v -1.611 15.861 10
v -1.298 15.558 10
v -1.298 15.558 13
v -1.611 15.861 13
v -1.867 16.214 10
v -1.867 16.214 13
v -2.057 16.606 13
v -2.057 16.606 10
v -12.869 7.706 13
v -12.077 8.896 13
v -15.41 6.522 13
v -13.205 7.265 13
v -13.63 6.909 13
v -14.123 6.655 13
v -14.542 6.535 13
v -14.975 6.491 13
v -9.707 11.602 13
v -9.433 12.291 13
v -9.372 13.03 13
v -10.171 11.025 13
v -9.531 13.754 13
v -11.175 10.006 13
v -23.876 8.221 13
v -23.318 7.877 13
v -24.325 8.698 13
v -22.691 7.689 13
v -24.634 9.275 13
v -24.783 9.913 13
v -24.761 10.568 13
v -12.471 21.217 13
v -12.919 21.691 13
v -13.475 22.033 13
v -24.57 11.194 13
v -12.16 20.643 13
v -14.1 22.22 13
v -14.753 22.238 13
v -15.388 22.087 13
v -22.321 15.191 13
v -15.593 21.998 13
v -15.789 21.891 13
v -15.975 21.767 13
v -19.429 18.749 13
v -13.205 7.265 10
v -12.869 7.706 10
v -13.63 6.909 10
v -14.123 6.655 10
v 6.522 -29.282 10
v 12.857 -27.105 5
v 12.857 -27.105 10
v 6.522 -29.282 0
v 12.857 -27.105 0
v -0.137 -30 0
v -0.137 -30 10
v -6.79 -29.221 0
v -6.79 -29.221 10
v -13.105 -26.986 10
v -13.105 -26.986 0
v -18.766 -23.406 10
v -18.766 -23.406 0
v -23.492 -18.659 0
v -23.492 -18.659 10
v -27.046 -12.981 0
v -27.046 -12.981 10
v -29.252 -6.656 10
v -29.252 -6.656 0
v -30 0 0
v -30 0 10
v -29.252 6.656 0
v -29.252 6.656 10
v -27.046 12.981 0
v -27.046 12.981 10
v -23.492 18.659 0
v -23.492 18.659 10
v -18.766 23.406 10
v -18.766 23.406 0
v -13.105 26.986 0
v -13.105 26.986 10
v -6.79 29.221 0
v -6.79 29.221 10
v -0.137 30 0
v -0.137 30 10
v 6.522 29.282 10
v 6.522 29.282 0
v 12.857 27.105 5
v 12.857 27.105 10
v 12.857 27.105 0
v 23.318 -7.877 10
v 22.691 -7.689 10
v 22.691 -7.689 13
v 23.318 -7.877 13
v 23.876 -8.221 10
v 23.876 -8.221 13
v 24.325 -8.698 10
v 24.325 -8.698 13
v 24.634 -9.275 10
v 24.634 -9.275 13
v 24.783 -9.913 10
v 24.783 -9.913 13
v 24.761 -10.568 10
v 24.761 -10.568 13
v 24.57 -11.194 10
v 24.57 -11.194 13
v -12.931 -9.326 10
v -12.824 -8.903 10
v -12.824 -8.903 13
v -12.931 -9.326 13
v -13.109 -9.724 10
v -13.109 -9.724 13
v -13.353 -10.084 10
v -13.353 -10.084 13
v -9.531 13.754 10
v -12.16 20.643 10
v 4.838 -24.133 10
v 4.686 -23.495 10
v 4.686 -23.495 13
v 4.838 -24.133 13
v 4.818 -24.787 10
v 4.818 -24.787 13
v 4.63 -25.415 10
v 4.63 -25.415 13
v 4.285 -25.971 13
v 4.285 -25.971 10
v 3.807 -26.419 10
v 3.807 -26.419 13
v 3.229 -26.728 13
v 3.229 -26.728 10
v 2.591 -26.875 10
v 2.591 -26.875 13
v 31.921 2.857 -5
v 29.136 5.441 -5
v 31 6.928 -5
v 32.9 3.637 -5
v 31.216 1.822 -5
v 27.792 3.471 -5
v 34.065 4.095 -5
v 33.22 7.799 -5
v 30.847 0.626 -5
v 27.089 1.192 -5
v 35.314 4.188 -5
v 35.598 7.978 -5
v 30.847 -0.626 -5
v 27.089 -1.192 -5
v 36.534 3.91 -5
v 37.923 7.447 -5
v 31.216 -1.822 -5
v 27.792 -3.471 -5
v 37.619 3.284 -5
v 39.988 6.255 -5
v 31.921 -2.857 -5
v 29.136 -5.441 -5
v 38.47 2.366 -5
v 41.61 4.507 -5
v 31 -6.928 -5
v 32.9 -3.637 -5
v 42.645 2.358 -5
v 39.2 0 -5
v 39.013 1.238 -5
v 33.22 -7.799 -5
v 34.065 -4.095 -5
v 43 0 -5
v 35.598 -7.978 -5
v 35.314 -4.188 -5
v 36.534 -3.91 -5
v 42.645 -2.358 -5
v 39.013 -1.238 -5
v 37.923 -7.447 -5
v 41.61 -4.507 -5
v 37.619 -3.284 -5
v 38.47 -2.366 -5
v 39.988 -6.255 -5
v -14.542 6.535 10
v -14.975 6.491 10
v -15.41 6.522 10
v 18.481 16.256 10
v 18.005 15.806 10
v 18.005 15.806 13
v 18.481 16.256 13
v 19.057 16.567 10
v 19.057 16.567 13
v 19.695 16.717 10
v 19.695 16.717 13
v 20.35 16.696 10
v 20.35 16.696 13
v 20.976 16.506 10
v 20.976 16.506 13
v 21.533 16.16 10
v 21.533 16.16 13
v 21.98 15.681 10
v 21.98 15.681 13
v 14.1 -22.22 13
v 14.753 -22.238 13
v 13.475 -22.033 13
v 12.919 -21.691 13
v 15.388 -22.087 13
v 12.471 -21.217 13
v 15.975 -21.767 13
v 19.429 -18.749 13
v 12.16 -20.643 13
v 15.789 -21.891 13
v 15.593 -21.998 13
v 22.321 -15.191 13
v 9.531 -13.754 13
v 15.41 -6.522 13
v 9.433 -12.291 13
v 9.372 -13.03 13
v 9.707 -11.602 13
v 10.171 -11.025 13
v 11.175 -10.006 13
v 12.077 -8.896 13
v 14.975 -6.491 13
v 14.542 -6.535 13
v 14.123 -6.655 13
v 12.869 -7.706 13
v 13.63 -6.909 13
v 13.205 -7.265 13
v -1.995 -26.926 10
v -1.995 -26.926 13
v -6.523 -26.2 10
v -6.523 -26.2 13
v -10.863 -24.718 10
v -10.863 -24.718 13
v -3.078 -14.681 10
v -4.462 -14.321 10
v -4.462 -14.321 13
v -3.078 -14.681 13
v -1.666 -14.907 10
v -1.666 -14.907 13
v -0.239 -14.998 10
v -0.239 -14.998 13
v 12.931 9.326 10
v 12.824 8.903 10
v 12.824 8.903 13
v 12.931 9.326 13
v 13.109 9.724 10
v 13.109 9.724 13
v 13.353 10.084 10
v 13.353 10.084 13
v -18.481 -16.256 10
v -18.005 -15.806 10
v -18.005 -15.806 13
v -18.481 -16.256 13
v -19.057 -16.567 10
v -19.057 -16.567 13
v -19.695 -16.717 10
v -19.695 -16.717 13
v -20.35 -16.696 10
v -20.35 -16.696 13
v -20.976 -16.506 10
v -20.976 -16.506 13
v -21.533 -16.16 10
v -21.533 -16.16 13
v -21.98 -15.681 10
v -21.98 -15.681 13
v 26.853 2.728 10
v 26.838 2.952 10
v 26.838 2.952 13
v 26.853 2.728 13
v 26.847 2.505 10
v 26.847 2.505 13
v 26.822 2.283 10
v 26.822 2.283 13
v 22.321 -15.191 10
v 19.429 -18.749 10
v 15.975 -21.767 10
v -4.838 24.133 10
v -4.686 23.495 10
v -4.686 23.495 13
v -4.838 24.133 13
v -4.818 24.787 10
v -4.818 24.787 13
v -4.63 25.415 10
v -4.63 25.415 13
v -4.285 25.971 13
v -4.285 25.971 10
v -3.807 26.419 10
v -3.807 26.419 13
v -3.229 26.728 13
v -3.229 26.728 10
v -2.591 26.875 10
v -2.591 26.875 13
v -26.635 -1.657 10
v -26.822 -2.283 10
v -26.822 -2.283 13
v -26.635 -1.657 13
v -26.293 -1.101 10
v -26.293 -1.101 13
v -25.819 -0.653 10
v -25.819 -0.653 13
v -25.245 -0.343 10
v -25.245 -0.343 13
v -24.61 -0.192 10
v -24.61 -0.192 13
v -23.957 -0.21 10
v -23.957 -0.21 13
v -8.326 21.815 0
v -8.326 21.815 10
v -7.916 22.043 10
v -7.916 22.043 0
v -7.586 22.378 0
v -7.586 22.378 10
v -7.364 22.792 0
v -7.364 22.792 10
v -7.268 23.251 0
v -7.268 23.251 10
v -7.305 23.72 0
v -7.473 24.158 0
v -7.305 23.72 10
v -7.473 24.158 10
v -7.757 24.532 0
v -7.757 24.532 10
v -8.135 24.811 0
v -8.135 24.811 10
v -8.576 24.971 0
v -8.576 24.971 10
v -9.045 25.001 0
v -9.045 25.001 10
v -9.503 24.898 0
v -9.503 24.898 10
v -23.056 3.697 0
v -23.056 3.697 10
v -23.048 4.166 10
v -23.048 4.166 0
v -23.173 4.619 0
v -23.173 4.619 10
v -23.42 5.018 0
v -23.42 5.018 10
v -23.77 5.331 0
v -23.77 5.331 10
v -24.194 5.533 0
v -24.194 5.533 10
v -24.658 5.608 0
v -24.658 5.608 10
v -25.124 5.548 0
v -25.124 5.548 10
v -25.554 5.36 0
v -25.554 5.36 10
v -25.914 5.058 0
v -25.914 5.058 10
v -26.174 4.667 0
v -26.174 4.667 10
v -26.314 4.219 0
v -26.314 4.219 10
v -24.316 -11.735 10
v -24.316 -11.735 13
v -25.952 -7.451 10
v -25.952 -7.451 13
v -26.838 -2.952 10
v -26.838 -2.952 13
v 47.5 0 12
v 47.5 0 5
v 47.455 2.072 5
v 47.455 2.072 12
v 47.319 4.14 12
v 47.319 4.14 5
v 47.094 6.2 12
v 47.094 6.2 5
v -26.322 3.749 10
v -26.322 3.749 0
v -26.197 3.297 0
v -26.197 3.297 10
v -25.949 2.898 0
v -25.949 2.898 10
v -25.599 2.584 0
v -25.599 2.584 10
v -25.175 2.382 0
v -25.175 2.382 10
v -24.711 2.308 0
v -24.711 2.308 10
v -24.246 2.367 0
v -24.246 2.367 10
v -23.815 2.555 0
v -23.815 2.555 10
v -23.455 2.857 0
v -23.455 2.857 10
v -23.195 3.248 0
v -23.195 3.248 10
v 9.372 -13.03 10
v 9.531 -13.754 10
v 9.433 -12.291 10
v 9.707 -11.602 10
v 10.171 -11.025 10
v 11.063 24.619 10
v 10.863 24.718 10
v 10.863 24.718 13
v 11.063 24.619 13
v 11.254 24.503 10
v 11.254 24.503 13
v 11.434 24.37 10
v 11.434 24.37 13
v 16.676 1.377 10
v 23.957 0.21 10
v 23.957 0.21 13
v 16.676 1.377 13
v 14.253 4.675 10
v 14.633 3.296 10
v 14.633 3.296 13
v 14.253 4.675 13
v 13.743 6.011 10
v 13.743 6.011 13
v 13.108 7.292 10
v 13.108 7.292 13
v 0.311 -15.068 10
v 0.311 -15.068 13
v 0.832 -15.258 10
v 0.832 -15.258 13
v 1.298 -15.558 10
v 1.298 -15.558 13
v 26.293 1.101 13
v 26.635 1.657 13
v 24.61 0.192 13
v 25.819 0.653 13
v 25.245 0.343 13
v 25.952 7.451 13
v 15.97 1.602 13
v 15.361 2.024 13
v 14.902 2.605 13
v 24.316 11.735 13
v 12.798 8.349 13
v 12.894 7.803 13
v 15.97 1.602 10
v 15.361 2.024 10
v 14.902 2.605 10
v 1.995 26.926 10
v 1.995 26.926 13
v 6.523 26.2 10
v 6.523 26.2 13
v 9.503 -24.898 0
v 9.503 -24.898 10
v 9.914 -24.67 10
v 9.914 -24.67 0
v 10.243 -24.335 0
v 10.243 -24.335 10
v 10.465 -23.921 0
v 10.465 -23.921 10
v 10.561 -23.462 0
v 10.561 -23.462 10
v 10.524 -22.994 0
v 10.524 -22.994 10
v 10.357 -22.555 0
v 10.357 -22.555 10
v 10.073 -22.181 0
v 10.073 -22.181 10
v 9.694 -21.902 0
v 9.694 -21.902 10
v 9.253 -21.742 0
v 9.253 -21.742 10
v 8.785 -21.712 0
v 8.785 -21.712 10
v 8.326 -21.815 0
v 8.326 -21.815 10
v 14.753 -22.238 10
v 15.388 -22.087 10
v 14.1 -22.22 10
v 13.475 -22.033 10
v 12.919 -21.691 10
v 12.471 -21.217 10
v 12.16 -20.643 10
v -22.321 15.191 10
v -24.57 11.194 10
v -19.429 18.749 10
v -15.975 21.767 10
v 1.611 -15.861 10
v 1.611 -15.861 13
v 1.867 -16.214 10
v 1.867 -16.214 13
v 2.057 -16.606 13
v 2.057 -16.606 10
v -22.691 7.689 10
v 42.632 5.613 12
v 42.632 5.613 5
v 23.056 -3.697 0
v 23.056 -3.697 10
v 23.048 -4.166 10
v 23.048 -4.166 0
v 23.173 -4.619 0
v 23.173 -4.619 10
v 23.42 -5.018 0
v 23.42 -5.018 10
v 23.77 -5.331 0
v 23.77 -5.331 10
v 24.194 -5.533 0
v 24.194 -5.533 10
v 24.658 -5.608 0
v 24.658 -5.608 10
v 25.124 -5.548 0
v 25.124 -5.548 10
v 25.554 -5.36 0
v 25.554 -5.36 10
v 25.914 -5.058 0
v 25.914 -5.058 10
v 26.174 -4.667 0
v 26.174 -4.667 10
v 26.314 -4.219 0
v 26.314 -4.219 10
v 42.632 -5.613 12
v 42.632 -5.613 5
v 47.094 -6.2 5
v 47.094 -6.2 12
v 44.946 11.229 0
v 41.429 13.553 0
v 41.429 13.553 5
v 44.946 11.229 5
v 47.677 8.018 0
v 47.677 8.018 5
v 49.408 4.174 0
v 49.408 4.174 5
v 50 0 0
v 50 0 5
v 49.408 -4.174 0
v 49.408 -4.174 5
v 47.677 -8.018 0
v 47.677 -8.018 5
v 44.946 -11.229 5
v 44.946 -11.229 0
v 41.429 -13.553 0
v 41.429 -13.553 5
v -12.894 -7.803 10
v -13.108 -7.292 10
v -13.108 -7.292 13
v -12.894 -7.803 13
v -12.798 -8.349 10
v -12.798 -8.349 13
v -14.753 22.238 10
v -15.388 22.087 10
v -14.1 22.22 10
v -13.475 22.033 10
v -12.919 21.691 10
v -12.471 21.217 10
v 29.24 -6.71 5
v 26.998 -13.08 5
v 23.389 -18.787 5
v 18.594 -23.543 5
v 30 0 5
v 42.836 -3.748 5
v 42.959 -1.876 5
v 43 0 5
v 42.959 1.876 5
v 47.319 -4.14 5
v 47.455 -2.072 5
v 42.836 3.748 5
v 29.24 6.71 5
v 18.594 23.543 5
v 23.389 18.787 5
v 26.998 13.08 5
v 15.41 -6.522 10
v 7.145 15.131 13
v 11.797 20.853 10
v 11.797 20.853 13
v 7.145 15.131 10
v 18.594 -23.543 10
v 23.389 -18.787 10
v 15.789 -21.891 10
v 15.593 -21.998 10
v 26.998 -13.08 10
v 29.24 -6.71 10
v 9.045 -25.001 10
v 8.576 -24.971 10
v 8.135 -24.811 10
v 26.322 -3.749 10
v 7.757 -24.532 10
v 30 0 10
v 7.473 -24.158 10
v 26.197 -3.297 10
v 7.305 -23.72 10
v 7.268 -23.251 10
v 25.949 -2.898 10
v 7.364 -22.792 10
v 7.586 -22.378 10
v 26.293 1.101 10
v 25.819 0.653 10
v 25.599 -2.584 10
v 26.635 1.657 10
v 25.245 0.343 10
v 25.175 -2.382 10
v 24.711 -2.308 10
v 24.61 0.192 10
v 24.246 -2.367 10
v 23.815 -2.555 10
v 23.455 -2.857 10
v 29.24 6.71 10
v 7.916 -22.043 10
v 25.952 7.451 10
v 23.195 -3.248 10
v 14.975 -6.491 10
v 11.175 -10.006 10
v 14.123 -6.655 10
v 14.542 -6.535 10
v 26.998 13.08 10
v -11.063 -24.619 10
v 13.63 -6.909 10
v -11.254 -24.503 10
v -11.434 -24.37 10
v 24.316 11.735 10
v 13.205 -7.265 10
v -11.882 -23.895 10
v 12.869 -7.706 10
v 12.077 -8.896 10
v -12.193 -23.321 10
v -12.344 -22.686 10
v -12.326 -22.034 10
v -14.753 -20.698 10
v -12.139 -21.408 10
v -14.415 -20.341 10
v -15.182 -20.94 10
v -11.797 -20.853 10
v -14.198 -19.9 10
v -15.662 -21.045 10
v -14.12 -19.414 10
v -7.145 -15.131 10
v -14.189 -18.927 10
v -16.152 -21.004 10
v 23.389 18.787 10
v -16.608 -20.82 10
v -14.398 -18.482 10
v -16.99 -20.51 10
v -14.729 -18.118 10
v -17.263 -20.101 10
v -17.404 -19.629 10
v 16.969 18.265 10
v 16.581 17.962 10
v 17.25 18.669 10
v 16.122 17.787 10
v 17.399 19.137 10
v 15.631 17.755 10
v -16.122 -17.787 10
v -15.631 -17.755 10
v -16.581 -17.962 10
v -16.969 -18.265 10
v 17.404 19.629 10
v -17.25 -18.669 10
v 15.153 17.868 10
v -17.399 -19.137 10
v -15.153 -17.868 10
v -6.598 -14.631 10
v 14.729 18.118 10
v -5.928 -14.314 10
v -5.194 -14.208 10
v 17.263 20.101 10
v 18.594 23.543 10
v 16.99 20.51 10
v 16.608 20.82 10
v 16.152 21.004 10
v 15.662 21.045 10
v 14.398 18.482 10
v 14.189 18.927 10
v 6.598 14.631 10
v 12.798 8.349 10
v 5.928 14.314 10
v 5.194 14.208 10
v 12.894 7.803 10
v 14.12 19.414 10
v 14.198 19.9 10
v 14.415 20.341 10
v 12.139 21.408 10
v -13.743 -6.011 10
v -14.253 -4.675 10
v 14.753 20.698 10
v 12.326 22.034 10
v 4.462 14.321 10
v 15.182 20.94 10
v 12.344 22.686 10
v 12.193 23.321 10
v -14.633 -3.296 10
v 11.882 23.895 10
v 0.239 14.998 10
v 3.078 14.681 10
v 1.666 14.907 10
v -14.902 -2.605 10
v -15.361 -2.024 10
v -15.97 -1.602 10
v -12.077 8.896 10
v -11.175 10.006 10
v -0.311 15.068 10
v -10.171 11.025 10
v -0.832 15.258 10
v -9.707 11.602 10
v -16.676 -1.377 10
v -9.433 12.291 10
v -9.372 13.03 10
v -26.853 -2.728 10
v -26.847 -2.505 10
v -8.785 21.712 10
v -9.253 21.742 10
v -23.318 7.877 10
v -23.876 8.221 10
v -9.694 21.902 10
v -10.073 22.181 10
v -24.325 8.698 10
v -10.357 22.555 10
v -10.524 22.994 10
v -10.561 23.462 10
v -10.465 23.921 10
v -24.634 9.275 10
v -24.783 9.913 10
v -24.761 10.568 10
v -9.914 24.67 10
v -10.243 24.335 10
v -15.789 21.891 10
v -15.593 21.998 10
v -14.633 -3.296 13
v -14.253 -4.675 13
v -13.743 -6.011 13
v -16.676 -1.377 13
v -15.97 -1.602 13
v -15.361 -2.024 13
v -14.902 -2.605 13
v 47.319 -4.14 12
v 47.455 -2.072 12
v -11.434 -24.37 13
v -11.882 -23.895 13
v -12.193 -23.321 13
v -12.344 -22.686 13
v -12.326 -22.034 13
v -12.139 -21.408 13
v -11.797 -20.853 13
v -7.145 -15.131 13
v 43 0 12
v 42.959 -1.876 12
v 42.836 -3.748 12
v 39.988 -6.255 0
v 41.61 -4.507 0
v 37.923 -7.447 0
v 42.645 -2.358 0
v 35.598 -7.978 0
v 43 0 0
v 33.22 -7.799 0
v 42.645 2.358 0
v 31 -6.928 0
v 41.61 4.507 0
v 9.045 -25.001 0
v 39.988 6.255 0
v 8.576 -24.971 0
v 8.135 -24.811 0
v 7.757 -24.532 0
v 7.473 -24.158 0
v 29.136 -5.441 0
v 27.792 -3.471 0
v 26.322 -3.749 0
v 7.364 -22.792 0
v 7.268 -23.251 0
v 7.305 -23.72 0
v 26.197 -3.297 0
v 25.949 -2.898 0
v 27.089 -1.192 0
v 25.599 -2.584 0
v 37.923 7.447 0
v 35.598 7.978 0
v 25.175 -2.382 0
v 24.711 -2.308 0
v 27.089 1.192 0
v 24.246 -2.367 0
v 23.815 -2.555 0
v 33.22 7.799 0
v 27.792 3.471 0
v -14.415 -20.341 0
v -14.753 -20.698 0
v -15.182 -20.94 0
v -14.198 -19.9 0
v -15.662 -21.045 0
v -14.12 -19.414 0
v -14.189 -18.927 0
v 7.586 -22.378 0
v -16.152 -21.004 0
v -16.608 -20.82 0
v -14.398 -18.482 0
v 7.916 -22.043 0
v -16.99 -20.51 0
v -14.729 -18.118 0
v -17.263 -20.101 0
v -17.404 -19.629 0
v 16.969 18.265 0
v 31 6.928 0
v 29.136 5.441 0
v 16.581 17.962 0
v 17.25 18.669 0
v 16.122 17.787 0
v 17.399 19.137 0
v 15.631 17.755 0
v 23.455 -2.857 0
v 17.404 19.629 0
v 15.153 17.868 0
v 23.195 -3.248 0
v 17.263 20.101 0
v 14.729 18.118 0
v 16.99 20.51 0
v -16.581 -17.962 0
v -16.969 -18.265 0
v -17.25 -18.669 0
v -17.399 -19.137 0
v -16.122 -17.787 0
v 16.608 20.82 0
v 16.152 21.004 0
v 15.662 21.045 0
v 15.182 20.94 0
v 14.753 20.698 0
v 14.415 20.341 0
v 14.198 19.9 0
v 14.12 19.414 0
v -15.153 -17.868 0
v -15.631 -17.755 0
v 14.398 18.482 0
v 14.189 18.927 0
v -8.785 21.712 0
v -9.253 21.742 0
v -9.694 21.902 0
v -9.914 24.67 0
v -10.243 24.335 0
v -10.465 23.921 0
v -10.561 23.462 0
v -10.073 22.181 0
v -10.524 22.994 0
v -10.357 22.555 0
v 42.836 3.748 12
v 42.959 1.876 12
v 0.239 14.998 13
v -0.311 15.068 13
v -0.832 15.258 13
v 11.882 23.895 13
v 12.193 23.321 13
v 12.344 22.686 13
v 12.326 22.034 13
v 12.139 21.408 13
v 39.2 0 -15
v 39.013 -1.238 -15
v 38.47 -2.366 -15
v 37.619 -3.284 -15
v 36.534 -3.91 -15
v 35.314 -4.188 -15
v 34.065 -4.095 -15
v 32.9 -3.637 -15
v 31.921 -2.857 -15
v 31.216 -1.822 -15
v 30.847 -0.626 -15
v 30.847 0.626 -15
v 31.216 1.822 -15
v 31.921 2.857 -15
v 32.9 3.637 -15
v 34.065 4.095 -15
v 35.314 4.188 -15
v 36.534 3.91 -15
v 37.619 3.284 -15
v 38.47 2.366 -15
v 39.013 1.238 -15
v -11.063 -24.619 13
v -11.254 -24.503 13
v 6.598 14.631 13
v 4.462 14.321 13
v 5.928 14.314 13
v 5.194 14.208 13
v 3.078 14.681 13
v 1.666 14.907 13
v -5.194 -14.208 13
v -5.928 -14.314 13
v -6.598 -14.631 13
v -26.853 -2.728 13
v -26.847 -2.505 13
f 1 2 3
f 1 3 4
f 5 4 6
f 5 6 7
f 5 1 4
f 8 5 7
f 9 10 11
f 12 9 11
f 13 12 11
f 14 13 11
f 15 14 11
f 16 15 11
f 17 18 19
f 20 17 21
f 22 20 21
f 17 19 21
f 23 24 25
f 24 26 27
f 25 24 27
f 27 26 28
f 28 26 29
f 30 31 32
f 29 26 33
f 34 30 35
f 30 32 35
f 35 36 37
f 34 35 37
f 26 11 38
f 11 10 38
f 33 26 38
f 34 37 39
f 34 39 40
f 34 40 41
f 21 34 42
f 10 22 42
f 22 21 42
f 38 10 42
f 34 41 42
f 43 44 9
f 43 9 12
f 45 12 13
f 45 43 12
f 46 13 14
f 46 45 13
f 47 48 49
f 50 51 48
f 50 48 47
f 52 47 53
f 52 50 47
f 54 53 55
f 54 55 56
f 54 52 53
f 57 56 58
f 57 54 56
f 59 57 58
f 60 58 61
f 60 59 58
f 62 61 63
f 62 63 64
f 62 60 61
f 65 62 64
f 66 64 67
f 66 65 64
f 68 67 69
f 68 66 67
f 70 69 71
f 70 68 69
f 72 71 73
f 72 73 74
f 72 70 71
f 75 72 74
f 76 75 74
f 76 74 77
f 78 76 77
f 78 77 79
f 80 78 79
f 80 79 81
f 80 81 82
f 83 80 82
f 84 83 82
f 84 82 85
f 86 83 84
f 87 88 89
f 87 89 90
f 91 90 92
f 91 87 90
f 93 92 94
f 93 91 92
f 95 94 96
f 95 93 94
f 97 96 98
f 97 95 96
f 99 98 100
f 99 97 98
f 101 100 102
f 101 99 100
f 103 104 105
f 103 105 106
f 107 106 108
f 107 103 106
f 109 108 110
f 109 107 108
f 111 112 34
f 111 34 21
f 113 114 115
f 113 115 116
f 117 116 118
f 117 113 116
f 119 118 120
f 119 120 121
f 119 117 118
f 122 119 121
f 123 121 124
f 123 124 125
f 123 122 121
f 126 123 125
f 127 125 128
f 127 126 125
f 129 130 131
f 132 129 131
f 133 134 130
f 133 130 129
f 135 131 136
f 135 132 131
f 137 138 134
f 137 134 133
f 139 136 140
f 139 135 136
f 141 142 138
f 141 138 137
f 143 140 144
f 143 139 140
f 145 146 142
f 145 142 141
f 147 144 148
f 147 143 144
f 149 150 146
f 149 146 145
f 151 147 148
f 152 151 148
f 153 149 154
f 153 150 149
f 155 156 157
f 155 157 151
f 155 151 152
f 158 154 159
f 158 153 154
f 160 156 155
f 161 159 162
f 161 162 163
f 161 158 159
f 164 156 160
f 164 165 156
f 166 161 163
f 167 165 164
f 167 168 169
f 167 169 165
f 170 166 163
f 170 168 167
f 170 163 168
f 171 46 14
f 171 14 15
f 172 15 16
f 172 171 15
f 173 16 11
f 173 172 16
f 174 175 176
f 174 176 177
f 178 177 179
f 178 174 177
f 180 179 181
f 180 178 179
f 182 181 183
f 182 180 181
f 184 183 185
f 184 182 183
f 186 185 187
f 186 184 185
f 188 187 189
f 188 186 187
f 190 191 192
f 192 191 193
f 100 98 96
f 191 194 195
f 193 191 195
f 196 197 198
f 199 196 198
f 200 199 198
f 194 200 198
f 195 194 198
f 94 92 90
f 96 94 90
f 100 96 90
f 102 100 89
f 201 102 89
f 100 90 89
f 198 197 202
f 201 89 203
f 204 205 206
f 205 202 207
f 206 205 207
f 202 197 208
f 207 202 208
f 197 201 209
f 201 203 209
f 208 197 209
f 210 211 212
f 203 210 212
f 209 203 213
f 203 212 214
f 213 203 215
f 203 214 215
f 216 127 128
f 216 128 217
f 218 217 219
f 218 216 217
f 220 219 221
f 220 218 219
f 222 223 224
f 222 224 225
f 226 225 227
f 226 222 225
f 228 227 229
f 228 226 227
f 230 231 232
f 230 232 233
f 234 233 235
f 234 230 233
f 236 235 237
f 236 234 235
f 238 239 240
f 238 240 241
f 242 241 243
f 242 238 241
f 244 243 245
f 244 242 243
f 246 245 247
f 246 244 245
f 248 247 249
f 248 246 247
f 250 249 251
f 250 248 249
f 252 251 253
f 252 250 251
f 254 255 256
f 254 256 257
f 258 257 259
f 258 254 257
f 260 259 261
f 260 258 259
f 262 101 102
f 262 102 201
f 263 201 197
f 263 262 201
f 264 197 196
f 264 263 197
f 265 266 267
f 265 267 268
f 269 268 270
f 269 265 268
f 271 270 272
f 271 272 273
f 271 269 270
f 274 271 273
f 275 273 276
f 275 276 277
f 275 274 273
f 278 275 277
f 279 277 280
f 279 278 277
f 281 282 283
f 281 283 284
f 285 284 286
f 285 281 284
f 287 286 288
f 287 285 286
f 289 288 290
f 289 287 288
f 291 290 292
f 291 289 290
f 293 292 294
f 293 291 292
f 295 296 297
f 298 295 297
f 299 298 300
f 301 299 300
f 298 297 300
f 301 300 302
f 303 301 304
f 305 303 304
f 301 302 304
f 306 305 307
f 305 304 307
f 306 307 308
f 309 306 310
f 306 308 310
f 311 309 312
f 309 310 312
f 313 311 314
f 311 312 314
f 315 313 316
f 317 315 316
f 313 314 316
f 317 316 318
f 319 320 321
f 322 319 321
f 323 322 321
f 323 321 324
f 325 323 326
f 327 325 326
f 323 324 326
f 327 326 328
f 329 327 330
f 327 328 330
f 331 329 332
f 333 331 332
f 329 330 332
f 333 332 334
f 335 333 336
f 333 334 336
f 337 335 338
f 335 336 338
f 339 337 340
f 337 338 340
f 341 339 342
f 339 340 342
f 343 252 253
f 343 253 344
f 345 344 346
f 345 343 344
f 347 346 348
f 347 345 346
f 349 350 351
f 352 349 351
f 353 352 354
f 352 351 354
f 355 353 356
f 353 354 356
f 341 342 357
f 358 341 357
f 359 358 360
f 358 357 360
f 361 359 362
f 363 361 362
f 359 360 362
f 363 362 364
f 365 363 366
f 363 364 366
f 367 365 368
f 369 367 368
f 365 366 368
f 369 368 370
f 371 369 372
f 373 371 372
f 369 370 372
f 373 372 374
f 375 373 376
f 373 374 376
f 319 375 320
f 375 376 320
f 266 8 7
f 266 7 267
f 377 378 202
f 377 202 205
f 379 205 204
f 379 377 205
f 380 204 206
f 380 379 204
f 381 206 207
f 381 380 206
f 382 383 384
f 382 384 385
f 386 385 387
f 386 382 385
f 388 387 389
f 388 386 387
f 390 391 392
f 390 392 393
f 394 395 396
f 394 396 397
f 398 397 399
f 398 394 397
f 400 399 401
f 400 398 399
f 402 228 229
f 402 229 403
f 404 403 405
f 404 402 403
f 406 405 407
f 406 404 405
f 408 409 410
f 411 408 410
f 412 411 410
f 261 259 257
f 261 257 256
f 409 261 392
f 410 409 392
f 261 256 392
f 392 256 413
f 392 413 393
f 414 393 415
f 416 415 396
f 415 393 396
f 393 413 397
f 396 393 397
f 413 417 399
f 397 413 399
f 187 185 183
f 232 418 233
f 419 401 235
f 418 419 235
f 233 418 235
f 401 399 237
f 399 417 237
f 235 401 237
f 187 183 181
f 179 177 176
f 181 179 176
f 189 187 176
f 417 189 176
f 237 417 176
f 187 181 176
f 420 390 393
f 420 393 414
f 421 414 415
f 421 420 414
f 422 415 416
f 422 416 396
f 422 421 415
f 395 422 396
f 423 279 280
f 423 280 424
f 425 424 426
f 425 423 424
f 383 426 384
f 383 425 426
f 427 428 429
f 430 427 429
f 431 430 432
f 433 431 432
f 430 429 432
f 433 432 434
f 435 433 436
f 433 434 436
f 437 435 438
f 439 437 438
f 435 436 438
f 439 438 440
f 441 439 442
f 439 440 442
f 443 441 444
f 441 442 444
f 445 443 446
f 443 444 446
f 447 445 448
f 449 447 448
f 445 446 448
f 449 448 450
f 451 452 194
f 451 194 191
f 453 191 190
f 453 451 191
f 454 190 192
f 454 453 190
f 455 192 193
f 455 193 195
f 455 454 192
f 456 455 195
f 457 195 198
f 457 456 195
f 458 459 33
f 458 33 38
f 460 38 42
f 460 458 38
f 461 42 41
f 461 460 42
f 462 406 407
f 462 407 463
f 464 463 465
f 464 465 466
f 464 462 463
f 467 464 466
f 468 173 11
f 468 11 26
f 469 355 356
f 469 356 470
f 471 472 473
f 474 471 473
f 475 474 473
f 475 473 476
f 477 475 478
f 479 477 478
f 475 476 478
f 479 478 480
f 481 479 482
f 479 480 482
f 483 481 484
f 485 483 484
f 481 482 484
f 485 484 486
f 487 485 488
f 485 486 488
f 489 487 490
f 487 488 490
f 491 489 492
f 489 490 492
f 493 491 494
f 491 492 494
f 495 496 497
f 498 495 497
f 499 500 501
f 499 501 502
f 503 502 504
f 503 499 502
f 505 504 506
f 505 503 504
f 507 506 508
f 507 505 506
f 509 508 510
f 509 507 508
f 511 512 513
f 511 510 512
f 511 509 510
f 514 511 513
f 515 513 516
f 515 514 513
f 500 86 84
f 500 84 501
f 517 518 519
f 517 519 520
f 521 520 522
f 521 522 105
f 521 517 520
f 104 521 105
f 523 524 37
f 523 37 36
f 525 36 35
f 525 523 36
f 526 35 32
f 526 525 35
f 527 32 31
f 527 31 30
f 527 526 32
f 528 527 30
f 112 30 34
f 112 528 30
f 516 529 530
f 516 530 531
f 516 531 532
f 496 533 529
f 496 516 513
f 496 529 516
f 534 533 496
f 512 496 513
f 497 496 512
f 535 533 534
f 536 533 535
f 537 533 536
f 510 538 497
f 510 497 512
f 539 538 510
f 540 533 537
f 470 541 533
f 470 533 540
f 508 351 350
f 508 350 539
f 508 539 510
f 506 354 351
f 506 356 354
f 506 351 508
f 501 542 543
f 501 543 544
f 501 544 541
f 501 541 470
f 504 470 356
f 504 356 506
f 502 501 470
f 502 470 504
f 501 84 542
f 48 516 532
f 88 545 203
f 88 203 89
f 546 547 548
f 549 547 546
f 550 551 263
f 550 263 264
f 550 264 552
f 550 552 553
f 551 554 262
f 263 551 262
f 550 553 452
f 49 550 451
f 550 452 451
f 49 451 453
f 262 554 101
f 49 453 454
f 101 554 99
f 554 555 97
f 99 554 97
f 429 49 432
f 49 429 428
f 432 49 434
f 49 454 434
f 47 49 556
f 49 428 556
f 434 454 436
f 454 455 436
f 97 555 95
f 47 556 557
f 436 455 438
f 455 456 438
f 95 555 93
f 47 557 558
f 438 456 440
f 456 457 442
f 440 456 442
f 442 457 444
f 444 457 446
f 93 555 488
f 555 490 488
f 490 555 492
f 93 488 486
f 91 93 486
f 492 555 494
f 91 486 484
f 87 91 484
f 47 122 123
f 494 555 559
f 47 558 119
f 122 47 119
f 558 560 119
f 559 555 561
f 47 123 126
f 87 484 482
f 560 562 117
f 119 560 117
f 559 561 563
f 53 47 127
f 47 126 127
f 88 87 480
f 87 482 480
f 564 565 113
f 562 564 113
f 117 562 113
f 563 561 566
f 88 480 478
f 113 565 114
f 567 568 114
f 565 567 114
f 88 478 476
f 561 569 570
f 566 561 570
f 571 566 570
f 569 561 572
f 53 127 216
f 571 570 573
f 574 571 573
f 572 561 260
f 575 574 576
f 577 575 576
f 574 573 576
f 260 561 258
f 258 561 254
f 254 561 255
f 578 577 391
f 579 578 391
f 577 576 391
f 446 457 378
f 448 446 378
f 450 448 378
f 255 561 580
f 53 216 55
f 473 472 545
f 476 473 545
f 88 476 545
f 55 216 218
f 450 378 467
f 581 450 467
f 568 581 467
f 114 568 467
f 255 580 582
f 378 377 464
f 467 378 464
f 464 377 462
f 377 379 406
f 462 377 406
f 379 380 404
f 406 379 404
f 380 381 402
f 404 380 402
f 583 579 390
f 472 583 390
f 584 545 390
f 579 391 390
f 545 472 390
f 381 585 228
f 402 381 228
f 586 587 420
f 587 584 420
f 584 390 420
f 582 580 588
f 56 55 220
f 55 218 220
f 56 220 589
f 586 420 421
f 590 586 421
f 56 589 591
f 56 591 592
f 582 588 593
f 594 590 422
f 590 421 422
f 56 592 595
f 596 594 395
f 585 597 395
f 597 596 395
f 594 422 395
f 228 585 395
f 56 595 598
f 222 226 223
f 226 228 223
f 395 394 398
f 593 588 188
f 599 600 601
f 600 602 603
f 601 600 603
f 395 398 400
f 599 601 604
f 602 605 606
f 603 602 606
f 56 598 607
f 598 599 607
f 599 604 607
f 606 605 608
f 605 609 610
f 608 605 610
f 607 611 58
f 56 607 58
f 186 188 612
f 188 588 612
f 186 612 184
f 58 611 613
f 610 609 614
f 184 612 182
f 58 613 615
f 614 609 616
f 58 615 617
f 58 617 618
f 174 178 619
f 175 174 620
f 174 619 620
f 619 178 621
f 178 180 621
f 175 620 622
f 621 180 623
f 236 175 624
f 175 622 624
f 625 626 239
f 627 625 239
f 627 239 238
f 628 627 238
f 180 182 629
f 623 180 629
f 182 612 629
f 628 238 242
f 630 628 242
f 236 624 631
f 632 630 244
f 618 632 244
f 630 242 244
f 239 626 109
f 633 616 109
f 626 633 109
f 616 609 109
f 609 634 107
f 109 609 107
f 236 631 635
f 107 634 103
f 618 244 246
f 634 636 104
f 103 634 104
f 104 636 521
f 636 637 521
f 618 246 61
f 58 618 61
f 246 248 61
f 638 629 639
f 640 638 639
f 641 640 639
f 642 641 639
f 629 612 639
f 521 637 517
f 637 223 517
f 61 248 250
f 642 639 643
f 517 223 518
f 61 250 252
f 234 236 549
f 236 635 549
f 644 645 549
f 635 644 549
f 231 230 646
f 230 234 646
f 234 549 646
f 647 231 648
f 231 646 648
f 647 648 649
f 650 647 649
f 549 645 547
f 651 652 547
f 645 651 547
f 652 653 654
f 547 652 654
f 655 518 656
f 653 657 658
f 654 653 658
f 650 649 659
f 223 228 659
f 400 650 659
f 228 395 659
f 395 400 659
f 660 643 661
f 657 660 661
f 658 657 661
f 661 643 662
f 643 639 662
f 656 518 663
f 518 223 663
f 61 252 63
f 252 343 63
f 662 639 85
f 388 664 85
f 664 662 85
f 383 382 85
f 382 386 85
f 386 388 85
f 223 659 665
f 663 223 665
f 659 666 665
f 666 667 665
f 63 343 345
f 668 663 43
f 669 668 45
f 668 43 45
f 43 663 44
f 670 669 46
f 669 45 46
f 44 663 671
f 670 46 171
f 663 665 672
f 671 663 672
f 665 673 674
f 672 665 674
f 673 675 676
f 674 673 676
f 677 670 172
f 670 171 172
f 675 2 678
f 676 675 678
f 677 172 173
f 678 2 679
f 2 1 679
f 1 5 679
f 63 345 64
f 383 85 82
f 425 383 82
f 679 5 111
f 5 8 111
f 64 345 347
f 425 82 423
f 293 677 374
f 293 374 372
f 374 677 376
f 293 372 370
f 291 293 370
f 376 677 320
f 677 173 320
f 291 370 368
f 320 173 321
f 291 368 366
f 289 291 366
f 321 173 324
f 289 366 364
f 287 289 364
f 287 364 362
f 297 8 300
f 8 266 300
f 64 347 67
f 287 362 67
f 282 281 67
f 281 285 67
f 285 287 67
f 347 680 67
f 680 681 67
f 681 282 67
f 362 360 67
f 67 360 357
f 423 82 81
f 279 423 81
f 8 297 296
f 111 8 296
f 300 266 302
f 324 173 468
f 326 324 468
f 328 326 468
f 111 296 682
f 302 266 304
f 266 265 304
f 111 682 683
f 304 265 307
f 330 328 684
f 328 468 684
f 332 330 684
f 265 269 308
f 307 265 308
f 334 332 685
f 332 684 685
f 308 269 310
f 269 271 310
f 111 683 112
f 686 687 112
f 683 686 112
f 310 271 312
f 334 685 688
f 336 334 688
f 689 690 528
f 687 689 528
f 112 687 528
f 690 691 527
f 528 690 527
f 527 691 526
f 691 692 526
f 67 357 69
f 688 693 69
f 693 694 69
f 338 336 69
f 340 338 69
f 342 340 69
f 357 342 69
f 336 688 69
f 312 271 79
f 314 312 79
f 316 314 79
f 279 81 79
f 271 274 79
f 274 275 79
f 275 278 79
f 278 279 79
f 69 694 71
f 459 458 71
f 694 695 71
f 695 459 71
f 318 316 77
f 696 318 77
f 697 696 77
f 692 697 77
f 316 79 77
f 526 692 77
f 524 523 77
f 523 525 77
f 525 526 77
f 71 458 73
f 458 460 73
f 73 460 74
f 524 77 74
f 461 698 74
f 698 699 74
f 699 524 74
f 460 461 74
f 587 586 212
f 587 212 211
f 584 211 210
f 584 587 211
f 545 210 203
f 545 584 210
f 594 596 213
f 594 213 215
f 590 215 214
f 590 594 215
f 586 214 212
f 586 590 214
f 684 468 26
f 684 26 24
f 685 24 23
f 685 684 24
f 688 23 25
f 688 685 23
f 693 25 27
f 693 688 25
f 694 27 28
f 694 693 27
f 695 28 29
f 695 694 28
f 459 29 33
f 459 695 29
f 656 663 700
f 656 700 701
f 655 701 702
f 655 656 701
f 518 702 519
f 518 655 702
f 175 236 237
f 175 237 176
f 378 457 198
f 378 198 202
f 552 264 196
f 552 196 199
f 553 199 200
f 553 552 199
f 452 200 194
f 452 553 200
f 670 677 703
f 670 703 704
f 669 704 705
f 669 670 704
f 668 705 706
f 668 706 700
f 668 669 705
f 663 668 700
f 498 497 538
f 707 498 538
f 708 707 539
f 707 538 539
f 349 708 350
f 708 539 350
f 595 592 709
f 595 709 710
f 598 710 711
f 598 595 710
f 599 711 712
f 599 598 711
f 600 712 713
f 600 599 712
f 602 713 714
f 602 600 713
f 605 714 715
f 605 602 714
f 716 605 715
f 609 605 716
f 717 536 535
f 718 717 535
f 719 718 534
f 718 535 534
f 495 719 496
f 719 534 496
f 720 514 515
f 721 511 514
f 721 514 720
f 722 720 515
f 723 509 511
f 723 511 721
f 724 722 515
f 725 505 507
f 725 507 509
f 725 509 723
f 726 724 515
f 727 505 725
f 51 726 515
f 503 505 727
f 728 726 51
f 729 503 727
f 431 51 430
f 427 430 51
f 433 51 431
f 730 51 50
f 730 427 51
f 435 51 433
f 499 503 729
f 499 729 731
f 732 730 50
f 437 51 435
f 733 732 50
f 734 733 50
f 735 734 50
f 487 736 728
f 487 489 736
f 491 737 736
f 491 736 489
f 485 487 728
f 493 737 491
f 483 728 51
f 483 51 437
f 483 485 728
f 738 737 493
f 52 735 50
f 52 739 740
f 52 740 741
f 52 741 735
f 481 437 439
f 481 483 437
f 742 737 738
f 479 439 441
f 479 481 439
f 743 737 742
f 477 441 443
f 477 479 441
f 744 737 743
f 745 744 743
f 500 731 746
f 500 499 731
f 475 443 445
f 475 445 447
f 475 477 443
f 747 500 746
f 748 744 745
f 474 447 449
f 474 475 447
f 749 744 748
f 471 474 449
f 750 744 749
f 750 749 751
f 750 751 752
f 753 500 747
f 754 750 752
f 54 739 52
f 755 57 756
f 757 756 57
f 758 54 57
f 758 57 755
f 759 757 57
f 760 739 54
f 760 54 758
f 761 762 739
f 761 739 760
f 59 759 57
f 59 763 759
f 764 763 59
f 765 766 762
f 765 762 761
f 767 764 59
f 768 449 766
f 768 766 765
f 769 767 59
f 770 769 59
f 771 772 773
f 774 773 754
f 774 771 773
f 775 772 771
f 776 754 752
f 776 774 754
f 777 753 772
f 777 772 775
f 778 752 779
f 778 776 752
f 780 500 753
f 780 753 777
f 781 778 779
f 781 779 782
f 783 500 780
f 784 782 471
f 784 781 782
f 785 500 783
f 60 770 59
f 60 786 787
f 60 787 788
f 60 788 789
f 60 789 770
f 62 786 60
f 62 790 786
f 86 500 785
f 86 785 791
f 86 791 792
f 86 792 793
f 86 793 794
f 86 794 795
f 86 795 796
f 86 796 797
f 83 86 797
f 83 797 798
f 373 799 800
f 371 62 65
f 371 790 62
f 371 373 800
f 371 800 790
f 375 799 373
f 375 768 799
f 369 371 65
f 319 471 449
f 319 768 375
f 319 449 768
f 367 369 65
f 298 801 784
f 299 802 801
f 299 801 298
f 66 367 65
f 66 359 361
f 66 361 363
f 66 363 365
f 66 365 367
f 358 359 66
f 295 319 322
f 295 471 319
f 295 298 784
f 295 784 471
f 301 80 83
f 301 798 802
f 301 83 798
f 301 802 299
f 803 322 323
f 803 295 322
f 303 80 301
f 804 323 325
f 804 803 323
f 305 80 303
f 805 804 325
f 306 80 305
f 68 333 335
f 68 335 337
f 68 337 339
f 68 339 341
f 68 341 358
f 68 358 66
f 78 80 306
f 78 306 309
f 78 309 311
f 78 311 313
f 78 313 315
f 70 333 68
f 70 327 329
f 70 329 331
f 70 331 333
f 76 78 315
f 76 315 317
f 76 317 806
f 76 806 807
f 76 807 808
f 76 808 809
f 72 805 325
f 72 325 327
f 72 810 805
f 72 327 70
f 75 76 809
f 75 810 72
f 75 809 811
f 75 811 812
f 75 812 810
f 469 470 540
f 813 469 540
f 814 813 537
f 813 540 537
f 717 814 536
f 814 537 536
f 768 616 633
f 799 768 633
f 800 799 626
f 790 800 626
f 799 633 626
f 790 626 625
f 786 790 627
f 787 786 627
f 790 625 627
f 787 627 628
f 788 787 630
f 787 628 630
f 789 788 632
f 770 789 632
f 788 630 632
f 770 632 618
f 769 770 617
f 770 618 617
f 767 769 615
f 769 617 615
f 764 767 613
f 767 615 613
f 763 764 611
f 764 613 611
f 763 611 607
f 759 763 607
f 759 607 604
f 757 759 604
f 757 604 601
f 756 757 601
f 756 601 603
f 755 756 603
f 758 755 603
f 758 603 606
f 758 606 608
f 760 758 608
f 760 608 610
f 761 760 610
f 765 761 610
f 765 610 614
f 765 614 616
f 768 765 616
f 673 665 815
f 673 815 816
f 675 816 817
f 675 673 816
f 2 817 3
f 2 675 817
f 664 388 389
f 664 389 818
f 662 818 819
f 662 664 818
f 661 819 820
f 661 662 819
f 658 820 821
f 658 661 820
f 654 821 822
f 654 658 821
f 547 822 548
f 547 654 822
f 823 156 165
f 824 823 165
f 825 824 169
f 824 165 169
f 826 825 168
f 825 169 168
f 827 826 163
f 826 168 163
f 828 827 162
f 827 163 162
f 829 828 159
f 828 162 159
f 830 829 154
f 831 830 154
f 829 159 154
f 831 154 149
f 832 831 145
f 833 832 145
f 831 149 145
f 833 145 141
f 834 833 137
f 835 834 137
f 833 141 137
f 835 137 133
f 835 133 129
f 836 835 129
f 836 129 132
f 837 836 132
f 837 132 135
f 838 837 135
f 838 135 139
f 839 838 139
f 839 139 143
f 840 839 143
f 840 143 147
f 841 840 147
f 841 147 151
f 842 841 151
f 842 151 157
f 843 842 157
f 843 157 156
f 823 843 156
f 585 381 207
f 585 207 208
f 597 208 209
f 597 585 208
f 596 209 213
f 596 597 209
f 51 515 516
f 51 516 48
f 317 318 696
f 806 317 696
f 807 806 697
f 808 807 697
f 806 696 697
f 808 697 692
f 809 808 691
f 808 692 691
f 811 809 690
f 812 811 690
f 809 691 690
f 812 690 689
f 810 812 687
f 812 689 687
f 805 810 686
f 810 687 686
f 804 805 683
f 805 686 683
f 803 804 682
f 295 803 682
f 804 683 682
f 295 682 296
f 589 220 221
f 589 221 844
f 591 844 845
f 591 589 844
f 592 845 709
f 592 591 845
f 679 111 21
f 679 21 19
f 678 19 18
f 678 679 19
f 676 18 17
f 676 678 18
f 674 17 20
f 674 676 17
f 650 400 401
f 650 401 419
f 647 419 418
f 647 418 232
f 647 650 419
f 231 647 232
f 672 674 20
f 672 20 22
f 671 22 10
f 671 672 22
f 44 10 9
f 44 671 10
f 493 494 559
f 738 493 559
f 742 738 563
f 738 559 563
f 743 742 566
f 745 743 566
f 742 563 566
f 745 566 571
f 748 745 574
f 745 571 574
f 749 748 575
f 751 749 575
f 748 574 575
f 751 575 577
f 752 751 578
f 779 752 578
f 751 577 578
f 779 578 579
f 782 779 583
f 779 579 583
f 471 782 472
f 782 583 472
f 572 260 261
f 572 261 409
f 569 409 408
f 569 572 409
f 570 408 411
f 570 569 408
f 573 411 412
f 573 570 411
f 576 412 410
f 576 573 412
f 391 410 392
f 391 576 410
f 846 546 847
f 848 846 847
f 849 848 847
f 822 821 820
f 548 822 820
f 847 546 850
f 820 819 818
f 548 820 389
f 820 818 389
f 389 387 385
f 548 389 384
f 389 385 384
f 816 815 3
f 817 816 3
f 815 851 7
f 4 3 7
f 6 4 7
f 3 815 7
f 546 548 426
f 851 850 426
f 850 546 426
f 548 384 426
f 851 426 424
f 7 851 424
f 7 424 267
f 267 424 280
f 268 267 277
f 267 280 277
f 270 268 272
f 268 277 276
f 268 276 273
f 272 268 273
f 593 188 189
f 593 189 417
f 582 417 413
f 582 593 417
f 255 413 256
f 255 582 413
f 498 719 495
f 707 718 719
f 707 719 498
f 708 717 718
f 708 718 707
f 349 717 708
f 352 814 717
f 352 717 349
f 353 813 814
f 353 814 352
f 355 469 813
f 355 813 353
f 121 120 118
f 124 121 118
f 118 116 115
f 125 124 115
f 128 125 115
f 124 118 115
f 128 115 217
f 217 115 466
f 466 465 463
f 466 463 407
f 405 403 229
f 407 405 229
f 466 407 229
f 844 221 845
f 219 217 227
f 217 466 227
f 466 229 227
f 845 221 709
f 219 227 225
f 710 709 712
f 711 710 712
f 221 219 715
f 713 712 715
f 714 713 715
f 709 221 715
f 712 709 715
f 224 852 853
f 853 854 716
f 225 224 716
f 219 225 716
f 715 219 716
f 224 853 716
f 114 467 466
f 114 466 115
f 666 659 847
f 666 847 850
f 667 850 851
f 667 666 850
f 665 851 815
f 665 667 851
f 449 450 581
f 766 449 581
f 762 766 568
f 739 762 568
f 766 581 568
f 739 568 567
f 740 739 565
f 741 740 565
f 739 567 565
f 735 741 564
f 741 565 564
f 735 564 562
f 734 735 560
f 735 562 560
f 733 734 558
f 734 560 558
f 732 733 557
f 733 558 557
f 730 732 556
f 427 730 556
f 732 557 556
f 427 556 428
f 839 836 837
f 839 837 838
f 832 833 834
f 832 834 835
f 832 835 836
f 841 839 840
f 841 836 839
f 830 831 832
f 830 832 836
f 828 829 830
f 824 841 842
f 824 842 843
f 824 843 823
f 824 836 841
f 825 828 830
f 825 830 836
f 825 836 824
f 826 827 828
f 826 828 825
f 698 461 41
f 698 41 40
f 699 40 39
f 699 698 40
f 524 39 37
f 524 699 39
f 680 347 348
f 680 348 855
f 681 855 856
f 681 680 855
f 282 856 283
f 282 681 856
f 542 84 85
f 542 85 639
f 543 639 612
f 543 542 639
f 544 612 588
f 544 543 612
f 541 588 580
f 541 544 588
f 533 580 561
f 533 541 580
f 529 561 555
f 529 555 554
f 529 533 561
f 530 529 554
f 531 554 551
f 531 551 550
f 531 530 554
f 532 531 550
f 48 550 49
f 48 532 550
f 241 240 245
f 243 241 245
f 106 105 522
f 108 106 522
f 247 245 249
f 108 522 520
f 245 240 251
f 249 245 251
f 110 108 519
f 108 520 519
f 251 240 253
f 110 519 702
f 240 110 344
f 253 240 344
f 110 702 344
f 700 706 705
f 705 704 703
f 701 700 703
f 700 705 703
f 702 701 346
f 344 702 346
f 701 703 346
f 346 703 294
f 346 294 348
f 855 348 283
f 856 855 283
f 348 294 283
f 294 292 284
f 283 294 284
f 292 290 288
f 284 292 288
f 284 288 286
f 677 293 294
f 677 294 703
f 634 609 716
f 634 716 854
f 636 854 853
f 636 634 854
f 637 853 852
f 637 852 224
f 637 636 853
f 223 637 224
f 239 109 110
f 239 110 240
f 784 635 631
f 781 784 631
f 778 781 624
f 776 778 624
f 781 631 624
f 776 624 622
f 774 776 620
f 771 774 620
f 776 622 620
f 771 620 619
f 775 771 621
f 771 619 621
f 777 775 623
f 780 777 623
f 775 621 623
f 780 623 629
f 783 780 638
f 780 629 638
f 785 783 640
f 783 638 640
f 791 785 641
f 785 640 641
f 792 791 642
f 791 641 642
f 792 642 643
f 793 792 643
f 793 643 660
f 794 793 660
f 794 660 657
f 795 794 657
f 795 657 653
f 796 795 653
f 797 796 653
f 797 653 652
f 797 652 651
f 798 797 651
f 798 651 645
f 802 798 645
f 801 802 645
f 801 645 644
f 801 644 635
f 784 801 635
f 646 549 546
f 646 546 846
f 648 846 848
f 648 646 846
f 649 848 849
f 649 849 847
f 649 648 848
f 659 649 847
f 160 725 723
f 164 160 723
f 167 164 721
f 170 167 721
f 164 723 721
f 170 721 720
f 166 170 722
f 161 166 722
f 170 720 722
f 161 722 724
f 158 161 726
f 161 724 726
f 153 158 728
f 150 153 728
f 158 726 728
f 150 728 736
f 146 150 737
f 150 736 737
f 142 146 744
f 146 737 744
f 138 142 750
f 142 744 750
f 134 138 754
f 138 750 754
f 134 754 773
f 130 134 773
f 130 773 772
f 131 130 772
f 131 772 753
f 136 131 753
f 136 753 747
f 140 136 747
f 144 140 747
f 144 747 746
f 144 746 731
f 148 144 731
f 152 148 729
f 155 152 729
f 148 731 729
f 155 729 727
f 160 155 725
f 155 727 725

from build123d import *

# Parameters (mm, degrees)
EXTRUDE_1_DEPTH     = 10
EXTRUDE_2_DEPTH     = 3
CUT_EXTRUDE_1_DEPTH = 60.160797831
CUT_EXTRUDE_START   = -5
CUT_EXTRUDE_2_DEPTH = 5
SKETCH_6_R          = 4.2
EXTRUDE_3_DEPTH     = 15
SKETCH_7_R          = 8
EXTRUDE_4_DEPTH     = 5
EXTRUDE_6_DEPTH     = 7


with BuildPart() as part:
    # 草图1 → 凸台-拉伸1 (new body)
    with BuildSketch(Plane.XY):
        with BuildLine():
            Line((12.857142857, 27.105237087), (41.428571429, 13.552618544))
            ThreePointArc((41.428571429, 13.552618544), (50, 0), (41.428571429, -13.552618544))
            Line((41.428571429, -13.552618544), (12.857142857, -27.105237087))
            ThreePointArc((12.857142857, -27.105237087), (-30, 0), (12.857142857, 27.105237087))
        make_face()
    extrude(amount=EXTRUDE_1_DEPTH)

    # 草图2 → 凸台-拉伸2 (add)
    with BuildSketch(Plane.XY.offset(10)):
        with BuildLine():
            Line((23.957377721, 0.209887463), (16.67642367, 1.377277592))
            ThreePointArc((16.67642367, 1.377277592), (15.360611936, 2.023540765), (14.633319135, 3.296357245))
            ThreePointArc((14.633319135, 3.296357245), (14.013905466, 5.34887405), (13.10820337, 7.292119336))
            ThreePointArc((13.10820337, 7.292119336), (12.830802367, 8.073818452), (12.824431404, 8.903254546))
            ThreePointArc((12.824431404, 8.903254546), (13.010978482, 9.528656304), (13.353035008, 10.084466078))
            Line((13.353035008, 10.084466078), (18.004501541, 15.806262185))
            ThreePointArc((18.004501541, 15.806262185), (20.022964964, 16.728032941), (21.979510308, 15.681234856))
            ThreePointArc((21.979510308, 15.681234856), (25.225029838, 9.62797329), (26.838176005, 2.95166203))
            ThreePointArc((26.838176005, 2.95166203), (26.85239584, 2.616563886), (26.821632235, 2.282578003))
            ThreePointArc((26.821632235, 2.282578003), (25.818773244, 0.6530262), (23.957377721, 0.209887463))
        make_face()
        with BuildLine():
            Line((15.409921311, -6.521834496), (22.690875361, -7.689224625))
            ThreePointArc((22.690875361, -7.689224625), (24.498383964, -8.976379847), (24.570102902, -11.194196862))
            ThreePointArc((24.570102902, -11.194196862), (20.950584375, -17.031530006), (15.975302304, -21.766711196))
            ThreePointArc((15.975302304, -21.766711196), (15.692208716, -21.946575006), (15.387586654, -22.086925885))
            ThreePointArc((15.387586654, -22.086925885), (13.4749239, -22.033200424), (12.160456735, -20.642753983))
            Line((12.160456735, -20.642753983), (9.530969218, -13.753567747))
            ThreePointArc((9.530969218, -13.753567747), (9.432743676, -12.290909771), (10.171388682, -11.02464749))
            ThreePointArc((10.171388682, -11.02464749), (11.639213542, -9.461961114), (12.869262278, -7.705977448))
            ThreePointArc((12.869262278, -7.705977448), (13.407533068, -7.074891575), (14.122660315, -6.654656112))
            ThreePointArc((14.122660315, -6.654656112), (14.757547664, -6.503509741), (15.409921311, -6.521834496))
        make_face()
        with BuildLine():
            Line((2.056886303, -16.606300573), (4.68637382, -23.49548681))
            ThreePointArc((4.68637382, -23.49548681), (4.475419, -25.704412788), (2.590592594, -26.875431718))
            ThreePointArc((2.590592594, -26.875431718), (-4.274445463, -26.659503296), (-10.862873701, -24.718373226))
            ThreePointArc((-10.862873701, -24.718373226), (-11.160187124, -24.563138893), (-11.434045581, -24.369503888))
            ThreePointArc((-11.434045581, -24.369503888), (-12.343849344, -22.686226624), (-11.796920986, -20.852641446))
            Line((-11.796920986, -20.852641446), (-7.145454452, -15.130845339))
            ThreePointArc((-7.145454452, -15.130845339), (-5.92786826, -14.314450537), (-4.461930453, -14.321004735))
            ThreePointArc((-4.461930453, -14.321004735), (-2.374691924, -14.810835164), (-0.238941092, -14.998096784))
            ThreePointArc((-0.238941092, -14.998096784), (0.576730701, -15.148710026), (1.298228911, -15.557910658))
            ThreePointArc((1.298228911, -15.557910658), (1.746569183, -16.032166046), (2.056886303, -16.606300573))
        make_face()
        with BuildLine():
            Line((-13.353035008, -10.084466078), (-18.004501541, -15.806262185))
            ThreePointArc((-18.004501541, -15.806262185), (-20.022964964, -16.728032941), (-21.979510308, -15.681234856))
            ThreePointArc((-21.979510308, -15.681234856), (-25.225029838, -9.62797329), (-26.838176005, -2.95166203))
            ThreePointArc((-26.838176005, -2.95166203), (-26.85239584, -2.616563886), (-26.821632235, -2.282578003))
            ThreePointArc((-26.821632235, -2.282578003), (-25.818773244, -0.6530262), (-23.957377721, -0.209887463))
            Line((-23.957377721, -0.209887463), (-16.67642367, -1.377277592))
            ThreePointArc((-16.67642367, -1.377277592), (-15.360611936, -2.023540765), (-14.633319135, -3.296357245))
            ThreePointArc((-14.633319135, -3.296357245), (-14.013905466, -5.34887405), (-13.10820337, -7.292119336))
            ThreePointArc((-13.10820337, -7.292119336), (-12.830802367, -8.073818452), (-12.824431404, -8.903254546))
            ThreePointArc((-12.824431404, -8.903254546), (-13.010978482, -9.528656304), (-13.353035008, -10.084466078))
        make_face()
        with BuildLine():
            Line((-15.409921311, 6.521834496), (-22.690875361, 7.689224625))
            ThreePointArc((-22.690875361, 7.689224625), (-24.498383964, 8.976379847), (-24.570102902, 11.194196862))
            ThreePointArc((-24.570102902, 11.194196862), (-20.950584375, 17.031530006), (-15.975302304, 21.766711196))
            ThreePointArc((-15.975302304, 21.766711196), (-15.692208716, 21.946575006), (-15.387586654, 22.086925885))
            ThreePointArc((-15.387586654, 22.086925885), (-13.4749239, 22.033200424), (-12.160456735, 20.642753983))
            Line((-12.160456735, 20.642753983), (-9.530969218, 13.753567747))
            ThreePointArc((-9.530969218, 13.753567747), (-9.432743676, 12.290909771), (-10.171388682, 11.02464749))
            ThreePointArc((-10.171388682, 11.02464749), (-11.639213542, 9.461961114), (-12.869262278, 7.705977448))
            ThreePointArc((-12.869262278, 7.705977448), (-13.407533068, 7.074891575), (-14.122660315, 6.654656112))
            ThreePointArc((-14.122660315, 6.654656112), (-14.757547664, 6.503509741), (-15.409921311, 6.521834496))
        make_face()
        with BuildLine():
            Line((-2.056886303, 16.606300573), (-4.68637382, 23.49548681))
            ThreePointArc((-4.68637382, 23.49548681), (-4.475419, 25.704412788), (-2.590592594, 26.875431718))
            ThreePointArc((-2.590592594, 26.875431718), (4.274445463, 26.659503296), (10.862873701, 24.718373226))
            ThreePointArc((10.862873701, 24.718373226), (11.160187124, 24.563138893), (11.434045581, 24.369503888))
            ThreePointArc((11.434045581, 24.369503888), (12.343849344, 22.686226624), (11.796920986, 20.852641446))
            Line((11.796920986, 20.852641446), (7.145454452, 15.130845339))
            ThreePointArc((7.145454452, 15.130845339), (5.92786826, 14.314450537), (4.461930453, 14.321004735))
            ThreePointArc((4.461930453, 14.321004735), (2.374691924, 14.810835164), (0.238941092, 14.998096784))
            ThreePointArc((0.238941092, 14.998096784), (-0.576730701, 15.148710026), (-1.298228911, 15.557910658))
            ThreePointArc((-1.298228911, 15.557910658), (-1.746569183, 16.032166046), (-2.056886303, 16.606300573))
        make_face()
    extrude(amount=EXTRUDE_2_DEPTH)

    # 草图4 → 切除-拉伸1 (cut, through all)
    with BuildSketch(Plane.XY.offset(10)):
        with BuildLine():
            ThreePointArc((26.313917142, -4.219035984), (24.945941386, -2.328628005), (23.055533406, -3.696603761))
            ThreePointArc((23.055533406, -3.696603761), (24.423509162, -5.587011741), (26.313917142, -4.219035984))
        make_face()
        with BuildLine():
            ThreePointArc((9.503166229, -24.89803871), (10.456319685, -22.768132964), (8.326413938, -21.814979508))
            ThreePointArc((8.326413938, -21.814979508), (7.373260482, -23.944885255), (9.503166229, -24.89803871))
        make_face()
        with BuildLine():
            ThreePointArc((-16.810750913, -20.679002726), (-14.489621701, -20.439504959), (-14.729119468, -18.118375747))
            ThreePointArc((-14.729119468, -18.118375747), (-17.05024868, -18.357873514), (-16.810750913, -20.679002726))
        make_face()
        with BuildLine():
            ThreePointArc((-26.313917142, 4.219035984), (-24.945941386, 2.328628005), (-23.055533406, 3.696603761))
            ThreePointArc((-23.055533406, 3.696603761), (-24.423509162, 5.587011741), (-26.313917142, 4.219035984))
        make_face()
        with BuildLine():
            ThreePointArc((-9.503166229, 24.89803871), (-10.456319685, 22.768132964), (-8.326413938, 21.814979508))
            ThreePointArc((-8.326413938, 21.814979508), (-7.373260482, 23.944885255), (-9.503166229, 24.89803871))
        make_face()
        with BuildLine():
            ThreePointArc((16.810750913, 20.679002726), (14.489621701, 20.439504959), (14.729119468, 18.118375747))
            ThreePointArc((14.729119468, 18.118375747), (17.05024868, 18.357873514), (16.810750913, 20.679002726))
        make_face()
    extrude(amount=-CUT_EXTRUDE_1_DEPTH, mode=Mode.SUBTRACT)

    # 草图5 → 切除-拉伸2 (cut)
    with BuildSketch(Plane.XY.offset(10).offset(CUT_EXTRUDE_START)):
        with BuildLine():
            Line((41.428571429, 13.552618544), (12.857142857, 27.105237087))
            ThreePointArc((12.857142857, 27.105237087), (30, 0), (12.857142857, -27.105237087))
            Line((12.857142857, -27.105237087), (41.428571429, -13.552618544))
            ThreePointArc((41.428571429, -13.552618544), (50, 0), (41.428571429, 13.552618544))
        make_face()
    extrude(amount=CUT_EXTRUDE_2_DEPTH, mode=Mode.SUBTRACT)

    # 草图6 → 凸台-拉伸3 (add)
    with BuildSketch(Plane(origin=(0, 0, 0), x_dir=(-1, 0, 0), z_dir=(0, 0, -1))):
        with Locations(Location((-35, 0, 0), (0, 0, 180))):
            Circle(SKETCH_6_R)
    extrude(amount=EXTRUDE_3_DEPTH)

    # 草图7 → 凸台-拉伸4 (add)
    with BuildSketch(Plane(origin=(0, 0, 0), x_dir=(-1, 0, 0), z_dir=(0, 0, -1))):
        with Locations(Location((-35, 0, 0), (0, 0, 180))):
            Circle(SKETCH_7_R)
    extrude(amount=EXTRUDE_4_DEPTH)

    # 草图8 → 凸台-拉伸6 (add)
    with BuildSketch(Plane.XY.offset(5)):
        with BuildLine():
            ThreePointArc((42.632129039, 5.612626265), (42.907933699, 2.812334557), (43, 0))
            Line((43, 0), (47.5, 0))
            ThreePointArc((47.5, 0), (47.398298854, 3.106648638), (47.093630915, 6.19999413))
            Line((47.093630915, 6.19999413), (42.632129039, 5.612626265))
        make_face()
        with BuildLine():
            Line((47.5, 0), (43, 0))
            ThreePointArc((43, 0), (42.907933699, -2.812334557), (42.632129039, -5.612626265))
            Line((42.632129039, -5.612626265), (47.093630915, -6.19999413))
            ThreePointArc((47.093630915, -6.19999413), (47.398298854, -3.106648638), (47.5, 0))
        make_face()
    extrude(amount=EXTRUDE_6_DEPTH)


solid = part.part
